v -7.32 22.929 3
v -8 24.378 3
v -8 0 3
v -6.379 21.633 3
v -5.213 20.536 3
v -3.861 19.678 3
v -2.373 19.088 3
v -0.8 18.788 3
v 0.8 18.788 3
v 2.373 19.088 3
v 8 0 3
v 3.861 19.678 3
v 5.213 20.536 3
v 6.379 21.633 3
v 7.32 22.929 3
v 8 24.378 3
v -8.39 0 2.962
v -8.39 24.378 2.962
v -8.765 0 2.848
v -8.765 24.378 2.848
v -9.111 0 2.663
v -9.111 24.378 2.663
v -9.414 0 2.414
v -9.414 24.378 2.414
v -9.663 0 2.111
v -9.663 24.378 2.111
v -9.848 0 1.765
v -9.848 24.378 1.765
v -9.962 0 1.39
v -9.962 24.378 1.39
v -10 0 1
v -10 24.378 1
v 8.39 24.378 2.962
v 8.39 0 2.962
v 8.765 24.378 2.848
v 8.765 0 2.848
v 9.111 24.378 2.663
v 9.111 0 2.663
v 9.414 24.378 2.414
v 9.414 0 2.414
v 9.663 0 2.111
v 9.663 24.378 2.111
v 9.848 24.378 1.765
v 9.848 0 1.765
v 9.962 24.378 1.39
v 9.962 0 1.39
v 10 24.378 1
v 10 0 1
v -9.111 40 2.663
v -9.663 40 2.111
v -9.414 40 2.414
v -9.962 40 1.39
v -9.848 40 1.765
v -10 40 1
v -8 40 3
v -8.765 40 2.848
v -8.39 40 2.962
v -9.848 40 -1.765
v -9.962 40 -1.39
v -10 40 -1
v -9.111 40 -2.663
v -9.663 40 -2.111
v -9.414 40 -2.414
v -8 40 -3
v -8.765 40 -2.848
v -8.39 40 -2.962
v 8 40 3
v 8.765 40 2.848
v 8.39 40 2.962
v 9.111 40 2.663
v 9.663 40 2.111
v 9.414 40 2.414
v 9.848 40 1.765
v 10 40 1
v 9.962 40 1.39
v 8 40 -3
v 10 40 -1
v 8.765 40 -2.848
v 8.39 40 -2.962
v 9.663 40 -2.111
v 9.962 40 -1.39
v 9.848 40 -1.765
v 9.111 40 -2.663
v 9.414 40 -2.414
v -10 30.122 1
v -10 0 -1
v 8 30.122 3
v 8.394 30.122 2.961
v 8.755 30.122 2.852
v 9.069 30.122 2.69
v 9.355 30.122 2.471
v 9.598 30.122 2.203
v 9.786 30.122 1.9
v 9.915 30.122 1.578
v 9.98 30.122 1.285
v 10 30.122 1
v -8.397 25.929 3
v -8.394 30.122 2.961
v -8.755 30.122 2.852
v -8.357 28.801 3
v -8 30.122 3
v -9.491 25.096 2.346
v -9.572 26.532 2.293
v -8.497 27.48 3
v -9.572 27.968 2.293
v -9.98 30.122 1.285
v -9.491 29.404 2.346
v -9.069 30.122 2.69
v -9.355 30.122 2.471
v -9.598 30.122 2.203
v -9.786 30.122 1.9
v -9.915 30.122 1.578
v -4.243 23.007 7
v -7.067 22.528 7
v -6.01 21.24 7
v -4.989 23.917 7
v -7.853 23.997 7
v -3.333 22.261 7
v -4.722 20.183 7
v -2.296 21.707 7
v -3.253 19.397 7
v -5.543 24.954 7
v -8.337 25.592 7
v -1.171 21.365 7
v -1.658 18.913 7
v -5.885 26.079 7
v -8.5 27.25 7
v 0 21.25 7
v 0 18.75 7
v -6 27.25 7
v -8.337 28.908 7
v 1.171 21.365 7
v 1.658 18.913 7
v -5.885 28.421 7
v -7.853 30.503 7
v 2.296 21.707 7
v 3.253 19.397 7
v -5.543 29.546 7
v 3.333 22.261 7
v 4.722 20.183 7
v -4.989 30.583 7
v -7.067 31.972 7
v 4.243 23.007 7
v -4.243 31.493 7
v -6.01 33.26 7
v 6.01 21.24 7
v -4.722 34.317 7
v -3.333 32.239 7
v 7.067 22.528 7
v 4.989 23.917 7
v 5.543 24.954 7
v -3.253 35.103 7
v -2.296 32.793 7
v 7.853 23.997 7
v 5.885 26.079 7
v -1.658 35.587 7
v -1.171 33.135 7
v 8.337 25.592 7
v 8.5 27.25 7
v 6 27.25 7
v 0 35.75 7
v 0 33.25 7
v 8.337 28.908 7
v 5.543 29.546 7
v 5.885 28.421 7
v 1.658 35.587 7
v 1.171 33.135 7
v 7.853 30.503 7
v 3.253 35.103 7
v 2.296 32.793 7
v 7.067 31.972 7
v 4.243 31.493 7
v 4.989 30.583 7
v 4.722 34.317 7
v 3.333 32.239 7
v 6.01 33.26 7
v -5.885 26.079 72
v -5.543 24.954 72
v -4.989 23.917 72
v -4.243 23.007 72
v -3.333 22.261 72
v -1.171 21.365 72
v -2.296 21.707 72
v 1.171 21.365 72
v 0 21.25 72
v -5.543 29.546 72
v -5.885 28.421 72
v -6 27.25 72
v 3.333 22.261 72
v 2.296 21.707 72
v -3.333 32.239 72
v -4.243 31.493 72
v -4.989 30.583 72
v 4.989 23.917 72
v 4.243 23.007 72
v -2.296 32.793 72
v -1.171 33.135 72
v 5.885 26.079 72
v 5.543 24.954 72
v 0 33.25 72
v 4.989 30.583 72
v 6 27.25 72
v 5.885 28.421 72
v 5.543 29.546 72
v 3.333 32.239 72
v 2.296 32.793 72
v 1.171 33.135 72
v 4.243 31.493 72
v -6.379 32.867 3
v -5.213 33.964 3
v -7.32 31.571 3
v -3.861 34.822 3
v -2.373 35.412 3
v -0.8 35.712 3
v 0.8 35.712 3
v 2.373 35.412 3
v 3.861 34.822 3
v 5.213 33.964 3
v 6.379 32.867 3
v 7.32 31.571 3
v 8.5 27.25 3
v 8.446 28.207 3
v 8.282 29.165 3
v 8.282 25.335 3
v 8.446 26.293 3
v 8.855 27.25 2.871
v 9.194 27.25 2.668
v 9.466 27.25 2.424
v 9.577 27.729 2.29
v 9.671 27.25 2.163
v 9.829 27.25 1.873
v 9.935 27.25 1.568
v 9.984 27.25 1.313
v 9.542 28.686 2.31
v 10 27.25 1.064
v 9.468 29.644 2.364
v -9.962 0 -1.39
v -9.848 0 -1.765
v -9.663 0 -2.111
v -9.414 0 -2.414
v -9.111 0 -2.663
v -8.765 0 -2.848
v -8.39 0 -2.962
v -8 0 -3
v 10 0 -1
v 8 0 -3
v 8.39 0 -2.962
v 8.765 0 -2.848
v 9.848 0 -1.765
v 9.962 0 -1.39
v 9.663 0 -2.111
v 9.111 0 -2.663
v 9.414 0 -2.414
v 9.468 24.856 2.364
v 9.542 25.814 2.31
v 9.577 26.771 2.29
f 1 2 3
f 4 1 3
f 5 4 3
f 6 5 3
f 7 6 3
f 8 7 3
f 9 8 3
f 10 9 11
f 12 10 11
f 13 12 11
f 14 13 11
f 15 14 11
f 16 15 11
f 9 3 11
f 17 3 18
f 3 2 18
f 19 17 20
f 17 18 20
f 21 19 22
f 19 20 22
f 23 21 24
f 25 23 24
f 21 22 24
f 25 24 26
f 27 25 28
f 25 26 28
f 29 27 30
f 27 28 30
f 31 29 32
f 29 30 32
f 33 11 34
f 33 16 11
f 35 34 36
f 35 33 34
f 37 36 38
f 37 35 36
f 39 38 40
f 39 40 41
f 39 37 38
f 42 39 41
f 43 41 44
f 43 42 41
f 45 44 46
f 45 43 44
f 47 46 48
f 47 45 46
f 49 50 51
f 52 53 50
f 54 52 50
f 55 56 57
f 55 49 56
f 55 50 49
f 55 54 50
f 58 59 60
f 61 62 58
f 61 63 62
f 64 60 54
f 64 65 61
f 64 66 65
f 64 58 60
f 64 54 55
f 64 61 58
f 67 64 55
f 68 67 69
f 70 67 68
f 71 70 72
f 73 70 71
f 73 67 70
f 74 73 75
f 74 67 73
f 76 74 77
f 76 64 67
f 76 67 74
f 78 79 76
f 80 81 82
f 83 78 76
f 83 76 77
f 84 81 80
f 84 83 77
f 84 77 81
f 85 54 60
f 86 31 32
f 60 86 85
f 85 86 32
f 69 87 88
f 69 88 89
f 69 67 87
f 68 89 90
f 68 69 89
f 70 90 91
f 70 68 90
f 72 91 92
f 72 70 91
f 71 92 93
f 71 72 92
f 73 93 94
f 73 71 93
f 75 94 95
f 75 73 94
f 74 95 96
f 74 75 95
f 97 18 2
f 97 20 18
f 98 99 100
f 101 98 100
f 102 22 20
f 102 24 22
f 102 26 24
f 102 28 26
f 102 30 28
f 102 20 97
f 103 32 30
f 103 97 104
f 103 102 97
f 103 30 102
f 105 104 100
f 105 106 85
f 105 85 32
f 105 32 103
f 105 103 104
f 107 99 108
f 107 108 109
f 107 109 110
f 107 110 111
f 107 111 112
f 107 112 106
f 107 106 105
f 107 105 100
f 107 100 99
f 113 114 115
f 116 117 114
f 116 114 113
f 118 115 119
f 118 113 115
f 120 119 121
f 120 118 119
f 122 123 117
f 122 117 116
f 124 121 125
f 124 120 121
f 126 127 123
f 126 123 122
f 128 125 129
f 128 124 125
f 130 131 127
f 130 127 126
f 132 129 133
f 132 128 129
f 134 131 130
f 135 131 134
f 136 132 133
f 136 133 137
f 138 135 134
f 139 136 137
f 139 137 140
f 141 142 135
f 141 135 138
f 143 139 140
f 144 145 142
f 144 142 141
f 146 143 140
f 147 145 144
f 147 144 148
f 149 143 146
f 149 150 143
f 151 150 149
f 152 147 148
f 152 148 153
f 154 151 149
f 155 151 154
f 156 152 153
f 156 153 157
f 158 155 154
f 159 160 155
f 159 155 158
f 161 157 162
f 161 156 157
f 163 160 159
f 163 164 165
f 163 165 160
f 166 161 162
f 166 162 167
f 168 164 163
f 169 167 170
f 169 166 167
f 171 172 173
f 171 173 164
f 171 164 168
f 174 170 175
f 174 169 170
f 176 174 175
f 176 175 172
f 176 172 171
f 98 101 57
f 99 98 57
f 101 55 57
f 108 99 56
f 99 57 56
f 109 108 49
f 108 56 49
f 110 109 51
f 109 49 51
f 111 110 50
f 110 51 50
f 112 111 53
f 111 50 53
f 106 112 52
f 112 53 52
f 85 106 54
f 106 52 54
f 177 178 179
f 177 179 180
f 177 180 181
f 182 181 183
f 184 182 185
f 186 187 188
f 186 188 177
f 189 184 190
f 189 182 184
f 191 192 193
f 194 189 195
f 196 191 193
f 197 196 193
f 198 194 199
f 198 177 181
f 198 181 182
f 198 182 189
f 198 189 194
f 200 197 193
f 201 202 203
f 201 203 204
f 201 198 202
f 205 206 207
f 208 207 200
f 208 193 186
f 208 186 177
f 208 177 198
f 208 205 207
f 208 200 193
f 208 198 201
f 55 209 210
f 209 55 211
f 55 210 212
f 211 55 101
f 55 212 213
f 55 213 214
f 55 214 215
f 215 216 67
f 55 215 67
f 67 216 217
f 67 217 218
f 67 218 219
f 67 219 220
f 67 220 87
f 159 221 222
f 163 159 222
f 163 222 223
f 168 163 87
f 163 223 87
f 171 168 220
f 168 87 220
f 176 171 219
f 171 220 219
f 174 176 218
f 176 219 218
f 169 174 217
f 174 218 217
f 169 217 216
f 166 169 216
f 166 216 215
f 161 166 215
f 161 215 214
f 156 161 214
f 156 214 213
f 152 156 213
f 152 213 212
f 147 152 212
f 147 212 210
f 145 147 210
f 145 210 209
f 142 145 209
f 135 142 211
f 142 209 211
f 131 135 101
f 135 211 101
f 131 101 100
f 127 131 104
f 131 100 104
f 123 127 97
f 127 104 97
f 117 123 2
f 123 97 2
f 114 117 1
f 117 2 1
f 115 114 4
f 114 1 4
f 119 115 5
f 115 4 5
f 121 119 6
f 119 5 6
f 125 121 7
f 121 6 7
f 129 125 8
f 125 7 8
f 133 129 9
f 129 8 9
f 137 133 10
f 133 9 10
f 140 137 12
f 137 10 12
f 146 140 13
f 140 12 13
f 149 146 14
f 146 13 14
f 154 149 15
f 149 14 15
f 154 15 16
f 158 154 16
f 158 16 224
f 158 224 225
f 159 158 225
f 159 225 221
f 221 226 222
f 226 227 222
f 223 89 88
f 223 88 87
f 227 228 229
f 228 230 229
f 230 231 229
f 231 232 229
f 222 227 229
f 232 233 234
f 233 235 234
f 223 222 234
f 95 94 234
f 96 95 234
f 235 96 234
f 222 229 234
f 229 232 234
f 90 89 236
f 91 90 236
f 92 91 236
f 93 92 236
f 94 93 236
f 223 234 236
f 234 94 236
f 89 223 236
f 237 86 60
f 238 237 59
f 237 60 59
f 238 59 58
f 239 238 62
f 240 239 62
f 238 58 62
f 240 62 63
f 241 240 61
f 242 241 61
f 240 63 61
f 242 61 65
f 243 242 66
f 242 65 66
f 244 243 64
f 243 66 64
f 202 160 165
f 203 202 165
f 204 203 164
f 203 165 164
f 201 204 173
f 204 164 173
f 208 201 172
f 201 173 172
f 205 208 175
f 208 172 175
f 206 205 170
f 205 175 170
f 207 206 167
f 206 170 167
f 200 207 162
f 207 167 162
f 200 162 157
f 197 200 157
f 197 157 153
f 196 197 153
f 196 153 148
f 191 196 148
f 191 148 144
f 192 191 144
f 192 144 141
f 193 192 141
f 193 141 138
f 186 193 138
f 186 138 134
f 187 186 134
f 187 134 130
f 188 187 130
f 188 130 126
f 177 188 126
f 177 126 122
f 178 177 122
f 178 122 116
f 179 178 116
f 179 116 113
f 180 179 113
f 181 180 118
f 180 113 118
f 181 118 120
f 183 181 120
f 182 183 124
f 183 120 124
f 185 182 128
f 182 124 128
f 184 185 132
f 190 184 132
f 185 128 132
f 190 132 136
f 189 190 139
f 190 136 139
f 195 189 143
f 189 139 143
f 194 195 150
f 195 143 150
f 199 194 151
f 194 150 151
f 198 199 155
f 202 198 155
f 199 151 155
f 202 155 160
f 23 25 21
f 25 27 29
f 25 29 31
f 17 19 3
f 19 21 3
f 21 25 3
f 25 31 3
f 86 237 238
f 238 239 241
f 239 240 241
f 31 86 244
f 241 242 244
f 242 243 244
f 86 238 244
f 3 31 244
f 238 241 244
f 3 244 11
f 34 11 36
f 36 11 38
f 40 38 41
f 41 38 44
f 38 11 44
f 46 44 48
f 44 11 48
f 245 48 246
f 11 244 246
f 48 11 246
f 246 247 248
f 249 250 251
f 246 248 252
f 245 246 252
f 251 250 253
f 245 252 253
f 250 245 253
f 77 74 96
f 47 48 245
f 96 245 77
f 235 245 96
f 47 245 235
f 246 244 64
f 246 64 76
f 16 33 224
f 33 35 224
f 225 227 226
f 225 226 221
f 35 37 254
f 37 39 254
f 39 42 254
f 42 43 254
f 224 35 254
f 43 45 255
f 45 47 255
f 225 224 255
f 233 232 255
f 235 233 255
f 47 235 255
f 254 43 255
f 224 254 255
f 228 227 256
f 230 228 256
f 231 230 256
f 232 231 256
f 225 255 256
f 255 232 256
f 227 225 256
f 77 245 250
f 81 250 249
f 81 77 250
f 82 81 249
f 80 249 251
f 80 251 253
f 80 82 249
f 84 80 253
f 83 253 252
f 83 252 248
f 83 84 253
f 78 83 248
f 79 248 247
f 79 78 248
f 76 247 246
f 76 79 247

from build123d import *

# Parameters (mm, degrees)
SKETCH1_W           = 20
SKETCH1_H           = 6
BOSS_EXTRUDE1_DEPTH = 40
SKETCH5_R           = 6
BOSS_EXTRUDE8_DEPTH = 69
SKETCH8_R           = 8.5
BOSS_EXTRUDE9_DEPTH = 4
FILLET1_R           = 2


with BuildPart() as part:
    # Sketch1 → Boss-Extrude1 (new body)
    with BuildSketch(Plane(origin=(0, 0, 0), x_dir=(1, 0, 0), z_dir=(0, 1, 0))):
        Rectangle(SKETCH1_W, SKETCH1_H)
    extrude(amount=BOSS_EXTRUDE1_DEPTH)

    # Sketch5 → Boss-Extrude8 (add)
    with BuildSketch(Plane.XY.offset(3)):
        with Locations((0, 27.25)):
            Circle(SKETCH5_R)
    extrude(amount=BOSS_EXTRUDE8_DEPTH)

    # Sketch8 → Boss-Extrude9 (add)
    with BuildSketch(Plane.XY.offset(3)):
        with Locations((0, 27.25)):
            Circle(SKETCH8_R)
    extrude(amount=BOSS_EXTRUDE9_DEPTH)

    # Fillet1
    fillet1_edges = [part.edges().sort_by_distance(p)[0] for p in [
        (-10, 20, -3),
        (10, 20, -3),
        (10, 20, 3),
        (-10, 20, 3),
    ]]
    fillet(fillet1_edges, radius=FILLET1_R)


solid = part.part
